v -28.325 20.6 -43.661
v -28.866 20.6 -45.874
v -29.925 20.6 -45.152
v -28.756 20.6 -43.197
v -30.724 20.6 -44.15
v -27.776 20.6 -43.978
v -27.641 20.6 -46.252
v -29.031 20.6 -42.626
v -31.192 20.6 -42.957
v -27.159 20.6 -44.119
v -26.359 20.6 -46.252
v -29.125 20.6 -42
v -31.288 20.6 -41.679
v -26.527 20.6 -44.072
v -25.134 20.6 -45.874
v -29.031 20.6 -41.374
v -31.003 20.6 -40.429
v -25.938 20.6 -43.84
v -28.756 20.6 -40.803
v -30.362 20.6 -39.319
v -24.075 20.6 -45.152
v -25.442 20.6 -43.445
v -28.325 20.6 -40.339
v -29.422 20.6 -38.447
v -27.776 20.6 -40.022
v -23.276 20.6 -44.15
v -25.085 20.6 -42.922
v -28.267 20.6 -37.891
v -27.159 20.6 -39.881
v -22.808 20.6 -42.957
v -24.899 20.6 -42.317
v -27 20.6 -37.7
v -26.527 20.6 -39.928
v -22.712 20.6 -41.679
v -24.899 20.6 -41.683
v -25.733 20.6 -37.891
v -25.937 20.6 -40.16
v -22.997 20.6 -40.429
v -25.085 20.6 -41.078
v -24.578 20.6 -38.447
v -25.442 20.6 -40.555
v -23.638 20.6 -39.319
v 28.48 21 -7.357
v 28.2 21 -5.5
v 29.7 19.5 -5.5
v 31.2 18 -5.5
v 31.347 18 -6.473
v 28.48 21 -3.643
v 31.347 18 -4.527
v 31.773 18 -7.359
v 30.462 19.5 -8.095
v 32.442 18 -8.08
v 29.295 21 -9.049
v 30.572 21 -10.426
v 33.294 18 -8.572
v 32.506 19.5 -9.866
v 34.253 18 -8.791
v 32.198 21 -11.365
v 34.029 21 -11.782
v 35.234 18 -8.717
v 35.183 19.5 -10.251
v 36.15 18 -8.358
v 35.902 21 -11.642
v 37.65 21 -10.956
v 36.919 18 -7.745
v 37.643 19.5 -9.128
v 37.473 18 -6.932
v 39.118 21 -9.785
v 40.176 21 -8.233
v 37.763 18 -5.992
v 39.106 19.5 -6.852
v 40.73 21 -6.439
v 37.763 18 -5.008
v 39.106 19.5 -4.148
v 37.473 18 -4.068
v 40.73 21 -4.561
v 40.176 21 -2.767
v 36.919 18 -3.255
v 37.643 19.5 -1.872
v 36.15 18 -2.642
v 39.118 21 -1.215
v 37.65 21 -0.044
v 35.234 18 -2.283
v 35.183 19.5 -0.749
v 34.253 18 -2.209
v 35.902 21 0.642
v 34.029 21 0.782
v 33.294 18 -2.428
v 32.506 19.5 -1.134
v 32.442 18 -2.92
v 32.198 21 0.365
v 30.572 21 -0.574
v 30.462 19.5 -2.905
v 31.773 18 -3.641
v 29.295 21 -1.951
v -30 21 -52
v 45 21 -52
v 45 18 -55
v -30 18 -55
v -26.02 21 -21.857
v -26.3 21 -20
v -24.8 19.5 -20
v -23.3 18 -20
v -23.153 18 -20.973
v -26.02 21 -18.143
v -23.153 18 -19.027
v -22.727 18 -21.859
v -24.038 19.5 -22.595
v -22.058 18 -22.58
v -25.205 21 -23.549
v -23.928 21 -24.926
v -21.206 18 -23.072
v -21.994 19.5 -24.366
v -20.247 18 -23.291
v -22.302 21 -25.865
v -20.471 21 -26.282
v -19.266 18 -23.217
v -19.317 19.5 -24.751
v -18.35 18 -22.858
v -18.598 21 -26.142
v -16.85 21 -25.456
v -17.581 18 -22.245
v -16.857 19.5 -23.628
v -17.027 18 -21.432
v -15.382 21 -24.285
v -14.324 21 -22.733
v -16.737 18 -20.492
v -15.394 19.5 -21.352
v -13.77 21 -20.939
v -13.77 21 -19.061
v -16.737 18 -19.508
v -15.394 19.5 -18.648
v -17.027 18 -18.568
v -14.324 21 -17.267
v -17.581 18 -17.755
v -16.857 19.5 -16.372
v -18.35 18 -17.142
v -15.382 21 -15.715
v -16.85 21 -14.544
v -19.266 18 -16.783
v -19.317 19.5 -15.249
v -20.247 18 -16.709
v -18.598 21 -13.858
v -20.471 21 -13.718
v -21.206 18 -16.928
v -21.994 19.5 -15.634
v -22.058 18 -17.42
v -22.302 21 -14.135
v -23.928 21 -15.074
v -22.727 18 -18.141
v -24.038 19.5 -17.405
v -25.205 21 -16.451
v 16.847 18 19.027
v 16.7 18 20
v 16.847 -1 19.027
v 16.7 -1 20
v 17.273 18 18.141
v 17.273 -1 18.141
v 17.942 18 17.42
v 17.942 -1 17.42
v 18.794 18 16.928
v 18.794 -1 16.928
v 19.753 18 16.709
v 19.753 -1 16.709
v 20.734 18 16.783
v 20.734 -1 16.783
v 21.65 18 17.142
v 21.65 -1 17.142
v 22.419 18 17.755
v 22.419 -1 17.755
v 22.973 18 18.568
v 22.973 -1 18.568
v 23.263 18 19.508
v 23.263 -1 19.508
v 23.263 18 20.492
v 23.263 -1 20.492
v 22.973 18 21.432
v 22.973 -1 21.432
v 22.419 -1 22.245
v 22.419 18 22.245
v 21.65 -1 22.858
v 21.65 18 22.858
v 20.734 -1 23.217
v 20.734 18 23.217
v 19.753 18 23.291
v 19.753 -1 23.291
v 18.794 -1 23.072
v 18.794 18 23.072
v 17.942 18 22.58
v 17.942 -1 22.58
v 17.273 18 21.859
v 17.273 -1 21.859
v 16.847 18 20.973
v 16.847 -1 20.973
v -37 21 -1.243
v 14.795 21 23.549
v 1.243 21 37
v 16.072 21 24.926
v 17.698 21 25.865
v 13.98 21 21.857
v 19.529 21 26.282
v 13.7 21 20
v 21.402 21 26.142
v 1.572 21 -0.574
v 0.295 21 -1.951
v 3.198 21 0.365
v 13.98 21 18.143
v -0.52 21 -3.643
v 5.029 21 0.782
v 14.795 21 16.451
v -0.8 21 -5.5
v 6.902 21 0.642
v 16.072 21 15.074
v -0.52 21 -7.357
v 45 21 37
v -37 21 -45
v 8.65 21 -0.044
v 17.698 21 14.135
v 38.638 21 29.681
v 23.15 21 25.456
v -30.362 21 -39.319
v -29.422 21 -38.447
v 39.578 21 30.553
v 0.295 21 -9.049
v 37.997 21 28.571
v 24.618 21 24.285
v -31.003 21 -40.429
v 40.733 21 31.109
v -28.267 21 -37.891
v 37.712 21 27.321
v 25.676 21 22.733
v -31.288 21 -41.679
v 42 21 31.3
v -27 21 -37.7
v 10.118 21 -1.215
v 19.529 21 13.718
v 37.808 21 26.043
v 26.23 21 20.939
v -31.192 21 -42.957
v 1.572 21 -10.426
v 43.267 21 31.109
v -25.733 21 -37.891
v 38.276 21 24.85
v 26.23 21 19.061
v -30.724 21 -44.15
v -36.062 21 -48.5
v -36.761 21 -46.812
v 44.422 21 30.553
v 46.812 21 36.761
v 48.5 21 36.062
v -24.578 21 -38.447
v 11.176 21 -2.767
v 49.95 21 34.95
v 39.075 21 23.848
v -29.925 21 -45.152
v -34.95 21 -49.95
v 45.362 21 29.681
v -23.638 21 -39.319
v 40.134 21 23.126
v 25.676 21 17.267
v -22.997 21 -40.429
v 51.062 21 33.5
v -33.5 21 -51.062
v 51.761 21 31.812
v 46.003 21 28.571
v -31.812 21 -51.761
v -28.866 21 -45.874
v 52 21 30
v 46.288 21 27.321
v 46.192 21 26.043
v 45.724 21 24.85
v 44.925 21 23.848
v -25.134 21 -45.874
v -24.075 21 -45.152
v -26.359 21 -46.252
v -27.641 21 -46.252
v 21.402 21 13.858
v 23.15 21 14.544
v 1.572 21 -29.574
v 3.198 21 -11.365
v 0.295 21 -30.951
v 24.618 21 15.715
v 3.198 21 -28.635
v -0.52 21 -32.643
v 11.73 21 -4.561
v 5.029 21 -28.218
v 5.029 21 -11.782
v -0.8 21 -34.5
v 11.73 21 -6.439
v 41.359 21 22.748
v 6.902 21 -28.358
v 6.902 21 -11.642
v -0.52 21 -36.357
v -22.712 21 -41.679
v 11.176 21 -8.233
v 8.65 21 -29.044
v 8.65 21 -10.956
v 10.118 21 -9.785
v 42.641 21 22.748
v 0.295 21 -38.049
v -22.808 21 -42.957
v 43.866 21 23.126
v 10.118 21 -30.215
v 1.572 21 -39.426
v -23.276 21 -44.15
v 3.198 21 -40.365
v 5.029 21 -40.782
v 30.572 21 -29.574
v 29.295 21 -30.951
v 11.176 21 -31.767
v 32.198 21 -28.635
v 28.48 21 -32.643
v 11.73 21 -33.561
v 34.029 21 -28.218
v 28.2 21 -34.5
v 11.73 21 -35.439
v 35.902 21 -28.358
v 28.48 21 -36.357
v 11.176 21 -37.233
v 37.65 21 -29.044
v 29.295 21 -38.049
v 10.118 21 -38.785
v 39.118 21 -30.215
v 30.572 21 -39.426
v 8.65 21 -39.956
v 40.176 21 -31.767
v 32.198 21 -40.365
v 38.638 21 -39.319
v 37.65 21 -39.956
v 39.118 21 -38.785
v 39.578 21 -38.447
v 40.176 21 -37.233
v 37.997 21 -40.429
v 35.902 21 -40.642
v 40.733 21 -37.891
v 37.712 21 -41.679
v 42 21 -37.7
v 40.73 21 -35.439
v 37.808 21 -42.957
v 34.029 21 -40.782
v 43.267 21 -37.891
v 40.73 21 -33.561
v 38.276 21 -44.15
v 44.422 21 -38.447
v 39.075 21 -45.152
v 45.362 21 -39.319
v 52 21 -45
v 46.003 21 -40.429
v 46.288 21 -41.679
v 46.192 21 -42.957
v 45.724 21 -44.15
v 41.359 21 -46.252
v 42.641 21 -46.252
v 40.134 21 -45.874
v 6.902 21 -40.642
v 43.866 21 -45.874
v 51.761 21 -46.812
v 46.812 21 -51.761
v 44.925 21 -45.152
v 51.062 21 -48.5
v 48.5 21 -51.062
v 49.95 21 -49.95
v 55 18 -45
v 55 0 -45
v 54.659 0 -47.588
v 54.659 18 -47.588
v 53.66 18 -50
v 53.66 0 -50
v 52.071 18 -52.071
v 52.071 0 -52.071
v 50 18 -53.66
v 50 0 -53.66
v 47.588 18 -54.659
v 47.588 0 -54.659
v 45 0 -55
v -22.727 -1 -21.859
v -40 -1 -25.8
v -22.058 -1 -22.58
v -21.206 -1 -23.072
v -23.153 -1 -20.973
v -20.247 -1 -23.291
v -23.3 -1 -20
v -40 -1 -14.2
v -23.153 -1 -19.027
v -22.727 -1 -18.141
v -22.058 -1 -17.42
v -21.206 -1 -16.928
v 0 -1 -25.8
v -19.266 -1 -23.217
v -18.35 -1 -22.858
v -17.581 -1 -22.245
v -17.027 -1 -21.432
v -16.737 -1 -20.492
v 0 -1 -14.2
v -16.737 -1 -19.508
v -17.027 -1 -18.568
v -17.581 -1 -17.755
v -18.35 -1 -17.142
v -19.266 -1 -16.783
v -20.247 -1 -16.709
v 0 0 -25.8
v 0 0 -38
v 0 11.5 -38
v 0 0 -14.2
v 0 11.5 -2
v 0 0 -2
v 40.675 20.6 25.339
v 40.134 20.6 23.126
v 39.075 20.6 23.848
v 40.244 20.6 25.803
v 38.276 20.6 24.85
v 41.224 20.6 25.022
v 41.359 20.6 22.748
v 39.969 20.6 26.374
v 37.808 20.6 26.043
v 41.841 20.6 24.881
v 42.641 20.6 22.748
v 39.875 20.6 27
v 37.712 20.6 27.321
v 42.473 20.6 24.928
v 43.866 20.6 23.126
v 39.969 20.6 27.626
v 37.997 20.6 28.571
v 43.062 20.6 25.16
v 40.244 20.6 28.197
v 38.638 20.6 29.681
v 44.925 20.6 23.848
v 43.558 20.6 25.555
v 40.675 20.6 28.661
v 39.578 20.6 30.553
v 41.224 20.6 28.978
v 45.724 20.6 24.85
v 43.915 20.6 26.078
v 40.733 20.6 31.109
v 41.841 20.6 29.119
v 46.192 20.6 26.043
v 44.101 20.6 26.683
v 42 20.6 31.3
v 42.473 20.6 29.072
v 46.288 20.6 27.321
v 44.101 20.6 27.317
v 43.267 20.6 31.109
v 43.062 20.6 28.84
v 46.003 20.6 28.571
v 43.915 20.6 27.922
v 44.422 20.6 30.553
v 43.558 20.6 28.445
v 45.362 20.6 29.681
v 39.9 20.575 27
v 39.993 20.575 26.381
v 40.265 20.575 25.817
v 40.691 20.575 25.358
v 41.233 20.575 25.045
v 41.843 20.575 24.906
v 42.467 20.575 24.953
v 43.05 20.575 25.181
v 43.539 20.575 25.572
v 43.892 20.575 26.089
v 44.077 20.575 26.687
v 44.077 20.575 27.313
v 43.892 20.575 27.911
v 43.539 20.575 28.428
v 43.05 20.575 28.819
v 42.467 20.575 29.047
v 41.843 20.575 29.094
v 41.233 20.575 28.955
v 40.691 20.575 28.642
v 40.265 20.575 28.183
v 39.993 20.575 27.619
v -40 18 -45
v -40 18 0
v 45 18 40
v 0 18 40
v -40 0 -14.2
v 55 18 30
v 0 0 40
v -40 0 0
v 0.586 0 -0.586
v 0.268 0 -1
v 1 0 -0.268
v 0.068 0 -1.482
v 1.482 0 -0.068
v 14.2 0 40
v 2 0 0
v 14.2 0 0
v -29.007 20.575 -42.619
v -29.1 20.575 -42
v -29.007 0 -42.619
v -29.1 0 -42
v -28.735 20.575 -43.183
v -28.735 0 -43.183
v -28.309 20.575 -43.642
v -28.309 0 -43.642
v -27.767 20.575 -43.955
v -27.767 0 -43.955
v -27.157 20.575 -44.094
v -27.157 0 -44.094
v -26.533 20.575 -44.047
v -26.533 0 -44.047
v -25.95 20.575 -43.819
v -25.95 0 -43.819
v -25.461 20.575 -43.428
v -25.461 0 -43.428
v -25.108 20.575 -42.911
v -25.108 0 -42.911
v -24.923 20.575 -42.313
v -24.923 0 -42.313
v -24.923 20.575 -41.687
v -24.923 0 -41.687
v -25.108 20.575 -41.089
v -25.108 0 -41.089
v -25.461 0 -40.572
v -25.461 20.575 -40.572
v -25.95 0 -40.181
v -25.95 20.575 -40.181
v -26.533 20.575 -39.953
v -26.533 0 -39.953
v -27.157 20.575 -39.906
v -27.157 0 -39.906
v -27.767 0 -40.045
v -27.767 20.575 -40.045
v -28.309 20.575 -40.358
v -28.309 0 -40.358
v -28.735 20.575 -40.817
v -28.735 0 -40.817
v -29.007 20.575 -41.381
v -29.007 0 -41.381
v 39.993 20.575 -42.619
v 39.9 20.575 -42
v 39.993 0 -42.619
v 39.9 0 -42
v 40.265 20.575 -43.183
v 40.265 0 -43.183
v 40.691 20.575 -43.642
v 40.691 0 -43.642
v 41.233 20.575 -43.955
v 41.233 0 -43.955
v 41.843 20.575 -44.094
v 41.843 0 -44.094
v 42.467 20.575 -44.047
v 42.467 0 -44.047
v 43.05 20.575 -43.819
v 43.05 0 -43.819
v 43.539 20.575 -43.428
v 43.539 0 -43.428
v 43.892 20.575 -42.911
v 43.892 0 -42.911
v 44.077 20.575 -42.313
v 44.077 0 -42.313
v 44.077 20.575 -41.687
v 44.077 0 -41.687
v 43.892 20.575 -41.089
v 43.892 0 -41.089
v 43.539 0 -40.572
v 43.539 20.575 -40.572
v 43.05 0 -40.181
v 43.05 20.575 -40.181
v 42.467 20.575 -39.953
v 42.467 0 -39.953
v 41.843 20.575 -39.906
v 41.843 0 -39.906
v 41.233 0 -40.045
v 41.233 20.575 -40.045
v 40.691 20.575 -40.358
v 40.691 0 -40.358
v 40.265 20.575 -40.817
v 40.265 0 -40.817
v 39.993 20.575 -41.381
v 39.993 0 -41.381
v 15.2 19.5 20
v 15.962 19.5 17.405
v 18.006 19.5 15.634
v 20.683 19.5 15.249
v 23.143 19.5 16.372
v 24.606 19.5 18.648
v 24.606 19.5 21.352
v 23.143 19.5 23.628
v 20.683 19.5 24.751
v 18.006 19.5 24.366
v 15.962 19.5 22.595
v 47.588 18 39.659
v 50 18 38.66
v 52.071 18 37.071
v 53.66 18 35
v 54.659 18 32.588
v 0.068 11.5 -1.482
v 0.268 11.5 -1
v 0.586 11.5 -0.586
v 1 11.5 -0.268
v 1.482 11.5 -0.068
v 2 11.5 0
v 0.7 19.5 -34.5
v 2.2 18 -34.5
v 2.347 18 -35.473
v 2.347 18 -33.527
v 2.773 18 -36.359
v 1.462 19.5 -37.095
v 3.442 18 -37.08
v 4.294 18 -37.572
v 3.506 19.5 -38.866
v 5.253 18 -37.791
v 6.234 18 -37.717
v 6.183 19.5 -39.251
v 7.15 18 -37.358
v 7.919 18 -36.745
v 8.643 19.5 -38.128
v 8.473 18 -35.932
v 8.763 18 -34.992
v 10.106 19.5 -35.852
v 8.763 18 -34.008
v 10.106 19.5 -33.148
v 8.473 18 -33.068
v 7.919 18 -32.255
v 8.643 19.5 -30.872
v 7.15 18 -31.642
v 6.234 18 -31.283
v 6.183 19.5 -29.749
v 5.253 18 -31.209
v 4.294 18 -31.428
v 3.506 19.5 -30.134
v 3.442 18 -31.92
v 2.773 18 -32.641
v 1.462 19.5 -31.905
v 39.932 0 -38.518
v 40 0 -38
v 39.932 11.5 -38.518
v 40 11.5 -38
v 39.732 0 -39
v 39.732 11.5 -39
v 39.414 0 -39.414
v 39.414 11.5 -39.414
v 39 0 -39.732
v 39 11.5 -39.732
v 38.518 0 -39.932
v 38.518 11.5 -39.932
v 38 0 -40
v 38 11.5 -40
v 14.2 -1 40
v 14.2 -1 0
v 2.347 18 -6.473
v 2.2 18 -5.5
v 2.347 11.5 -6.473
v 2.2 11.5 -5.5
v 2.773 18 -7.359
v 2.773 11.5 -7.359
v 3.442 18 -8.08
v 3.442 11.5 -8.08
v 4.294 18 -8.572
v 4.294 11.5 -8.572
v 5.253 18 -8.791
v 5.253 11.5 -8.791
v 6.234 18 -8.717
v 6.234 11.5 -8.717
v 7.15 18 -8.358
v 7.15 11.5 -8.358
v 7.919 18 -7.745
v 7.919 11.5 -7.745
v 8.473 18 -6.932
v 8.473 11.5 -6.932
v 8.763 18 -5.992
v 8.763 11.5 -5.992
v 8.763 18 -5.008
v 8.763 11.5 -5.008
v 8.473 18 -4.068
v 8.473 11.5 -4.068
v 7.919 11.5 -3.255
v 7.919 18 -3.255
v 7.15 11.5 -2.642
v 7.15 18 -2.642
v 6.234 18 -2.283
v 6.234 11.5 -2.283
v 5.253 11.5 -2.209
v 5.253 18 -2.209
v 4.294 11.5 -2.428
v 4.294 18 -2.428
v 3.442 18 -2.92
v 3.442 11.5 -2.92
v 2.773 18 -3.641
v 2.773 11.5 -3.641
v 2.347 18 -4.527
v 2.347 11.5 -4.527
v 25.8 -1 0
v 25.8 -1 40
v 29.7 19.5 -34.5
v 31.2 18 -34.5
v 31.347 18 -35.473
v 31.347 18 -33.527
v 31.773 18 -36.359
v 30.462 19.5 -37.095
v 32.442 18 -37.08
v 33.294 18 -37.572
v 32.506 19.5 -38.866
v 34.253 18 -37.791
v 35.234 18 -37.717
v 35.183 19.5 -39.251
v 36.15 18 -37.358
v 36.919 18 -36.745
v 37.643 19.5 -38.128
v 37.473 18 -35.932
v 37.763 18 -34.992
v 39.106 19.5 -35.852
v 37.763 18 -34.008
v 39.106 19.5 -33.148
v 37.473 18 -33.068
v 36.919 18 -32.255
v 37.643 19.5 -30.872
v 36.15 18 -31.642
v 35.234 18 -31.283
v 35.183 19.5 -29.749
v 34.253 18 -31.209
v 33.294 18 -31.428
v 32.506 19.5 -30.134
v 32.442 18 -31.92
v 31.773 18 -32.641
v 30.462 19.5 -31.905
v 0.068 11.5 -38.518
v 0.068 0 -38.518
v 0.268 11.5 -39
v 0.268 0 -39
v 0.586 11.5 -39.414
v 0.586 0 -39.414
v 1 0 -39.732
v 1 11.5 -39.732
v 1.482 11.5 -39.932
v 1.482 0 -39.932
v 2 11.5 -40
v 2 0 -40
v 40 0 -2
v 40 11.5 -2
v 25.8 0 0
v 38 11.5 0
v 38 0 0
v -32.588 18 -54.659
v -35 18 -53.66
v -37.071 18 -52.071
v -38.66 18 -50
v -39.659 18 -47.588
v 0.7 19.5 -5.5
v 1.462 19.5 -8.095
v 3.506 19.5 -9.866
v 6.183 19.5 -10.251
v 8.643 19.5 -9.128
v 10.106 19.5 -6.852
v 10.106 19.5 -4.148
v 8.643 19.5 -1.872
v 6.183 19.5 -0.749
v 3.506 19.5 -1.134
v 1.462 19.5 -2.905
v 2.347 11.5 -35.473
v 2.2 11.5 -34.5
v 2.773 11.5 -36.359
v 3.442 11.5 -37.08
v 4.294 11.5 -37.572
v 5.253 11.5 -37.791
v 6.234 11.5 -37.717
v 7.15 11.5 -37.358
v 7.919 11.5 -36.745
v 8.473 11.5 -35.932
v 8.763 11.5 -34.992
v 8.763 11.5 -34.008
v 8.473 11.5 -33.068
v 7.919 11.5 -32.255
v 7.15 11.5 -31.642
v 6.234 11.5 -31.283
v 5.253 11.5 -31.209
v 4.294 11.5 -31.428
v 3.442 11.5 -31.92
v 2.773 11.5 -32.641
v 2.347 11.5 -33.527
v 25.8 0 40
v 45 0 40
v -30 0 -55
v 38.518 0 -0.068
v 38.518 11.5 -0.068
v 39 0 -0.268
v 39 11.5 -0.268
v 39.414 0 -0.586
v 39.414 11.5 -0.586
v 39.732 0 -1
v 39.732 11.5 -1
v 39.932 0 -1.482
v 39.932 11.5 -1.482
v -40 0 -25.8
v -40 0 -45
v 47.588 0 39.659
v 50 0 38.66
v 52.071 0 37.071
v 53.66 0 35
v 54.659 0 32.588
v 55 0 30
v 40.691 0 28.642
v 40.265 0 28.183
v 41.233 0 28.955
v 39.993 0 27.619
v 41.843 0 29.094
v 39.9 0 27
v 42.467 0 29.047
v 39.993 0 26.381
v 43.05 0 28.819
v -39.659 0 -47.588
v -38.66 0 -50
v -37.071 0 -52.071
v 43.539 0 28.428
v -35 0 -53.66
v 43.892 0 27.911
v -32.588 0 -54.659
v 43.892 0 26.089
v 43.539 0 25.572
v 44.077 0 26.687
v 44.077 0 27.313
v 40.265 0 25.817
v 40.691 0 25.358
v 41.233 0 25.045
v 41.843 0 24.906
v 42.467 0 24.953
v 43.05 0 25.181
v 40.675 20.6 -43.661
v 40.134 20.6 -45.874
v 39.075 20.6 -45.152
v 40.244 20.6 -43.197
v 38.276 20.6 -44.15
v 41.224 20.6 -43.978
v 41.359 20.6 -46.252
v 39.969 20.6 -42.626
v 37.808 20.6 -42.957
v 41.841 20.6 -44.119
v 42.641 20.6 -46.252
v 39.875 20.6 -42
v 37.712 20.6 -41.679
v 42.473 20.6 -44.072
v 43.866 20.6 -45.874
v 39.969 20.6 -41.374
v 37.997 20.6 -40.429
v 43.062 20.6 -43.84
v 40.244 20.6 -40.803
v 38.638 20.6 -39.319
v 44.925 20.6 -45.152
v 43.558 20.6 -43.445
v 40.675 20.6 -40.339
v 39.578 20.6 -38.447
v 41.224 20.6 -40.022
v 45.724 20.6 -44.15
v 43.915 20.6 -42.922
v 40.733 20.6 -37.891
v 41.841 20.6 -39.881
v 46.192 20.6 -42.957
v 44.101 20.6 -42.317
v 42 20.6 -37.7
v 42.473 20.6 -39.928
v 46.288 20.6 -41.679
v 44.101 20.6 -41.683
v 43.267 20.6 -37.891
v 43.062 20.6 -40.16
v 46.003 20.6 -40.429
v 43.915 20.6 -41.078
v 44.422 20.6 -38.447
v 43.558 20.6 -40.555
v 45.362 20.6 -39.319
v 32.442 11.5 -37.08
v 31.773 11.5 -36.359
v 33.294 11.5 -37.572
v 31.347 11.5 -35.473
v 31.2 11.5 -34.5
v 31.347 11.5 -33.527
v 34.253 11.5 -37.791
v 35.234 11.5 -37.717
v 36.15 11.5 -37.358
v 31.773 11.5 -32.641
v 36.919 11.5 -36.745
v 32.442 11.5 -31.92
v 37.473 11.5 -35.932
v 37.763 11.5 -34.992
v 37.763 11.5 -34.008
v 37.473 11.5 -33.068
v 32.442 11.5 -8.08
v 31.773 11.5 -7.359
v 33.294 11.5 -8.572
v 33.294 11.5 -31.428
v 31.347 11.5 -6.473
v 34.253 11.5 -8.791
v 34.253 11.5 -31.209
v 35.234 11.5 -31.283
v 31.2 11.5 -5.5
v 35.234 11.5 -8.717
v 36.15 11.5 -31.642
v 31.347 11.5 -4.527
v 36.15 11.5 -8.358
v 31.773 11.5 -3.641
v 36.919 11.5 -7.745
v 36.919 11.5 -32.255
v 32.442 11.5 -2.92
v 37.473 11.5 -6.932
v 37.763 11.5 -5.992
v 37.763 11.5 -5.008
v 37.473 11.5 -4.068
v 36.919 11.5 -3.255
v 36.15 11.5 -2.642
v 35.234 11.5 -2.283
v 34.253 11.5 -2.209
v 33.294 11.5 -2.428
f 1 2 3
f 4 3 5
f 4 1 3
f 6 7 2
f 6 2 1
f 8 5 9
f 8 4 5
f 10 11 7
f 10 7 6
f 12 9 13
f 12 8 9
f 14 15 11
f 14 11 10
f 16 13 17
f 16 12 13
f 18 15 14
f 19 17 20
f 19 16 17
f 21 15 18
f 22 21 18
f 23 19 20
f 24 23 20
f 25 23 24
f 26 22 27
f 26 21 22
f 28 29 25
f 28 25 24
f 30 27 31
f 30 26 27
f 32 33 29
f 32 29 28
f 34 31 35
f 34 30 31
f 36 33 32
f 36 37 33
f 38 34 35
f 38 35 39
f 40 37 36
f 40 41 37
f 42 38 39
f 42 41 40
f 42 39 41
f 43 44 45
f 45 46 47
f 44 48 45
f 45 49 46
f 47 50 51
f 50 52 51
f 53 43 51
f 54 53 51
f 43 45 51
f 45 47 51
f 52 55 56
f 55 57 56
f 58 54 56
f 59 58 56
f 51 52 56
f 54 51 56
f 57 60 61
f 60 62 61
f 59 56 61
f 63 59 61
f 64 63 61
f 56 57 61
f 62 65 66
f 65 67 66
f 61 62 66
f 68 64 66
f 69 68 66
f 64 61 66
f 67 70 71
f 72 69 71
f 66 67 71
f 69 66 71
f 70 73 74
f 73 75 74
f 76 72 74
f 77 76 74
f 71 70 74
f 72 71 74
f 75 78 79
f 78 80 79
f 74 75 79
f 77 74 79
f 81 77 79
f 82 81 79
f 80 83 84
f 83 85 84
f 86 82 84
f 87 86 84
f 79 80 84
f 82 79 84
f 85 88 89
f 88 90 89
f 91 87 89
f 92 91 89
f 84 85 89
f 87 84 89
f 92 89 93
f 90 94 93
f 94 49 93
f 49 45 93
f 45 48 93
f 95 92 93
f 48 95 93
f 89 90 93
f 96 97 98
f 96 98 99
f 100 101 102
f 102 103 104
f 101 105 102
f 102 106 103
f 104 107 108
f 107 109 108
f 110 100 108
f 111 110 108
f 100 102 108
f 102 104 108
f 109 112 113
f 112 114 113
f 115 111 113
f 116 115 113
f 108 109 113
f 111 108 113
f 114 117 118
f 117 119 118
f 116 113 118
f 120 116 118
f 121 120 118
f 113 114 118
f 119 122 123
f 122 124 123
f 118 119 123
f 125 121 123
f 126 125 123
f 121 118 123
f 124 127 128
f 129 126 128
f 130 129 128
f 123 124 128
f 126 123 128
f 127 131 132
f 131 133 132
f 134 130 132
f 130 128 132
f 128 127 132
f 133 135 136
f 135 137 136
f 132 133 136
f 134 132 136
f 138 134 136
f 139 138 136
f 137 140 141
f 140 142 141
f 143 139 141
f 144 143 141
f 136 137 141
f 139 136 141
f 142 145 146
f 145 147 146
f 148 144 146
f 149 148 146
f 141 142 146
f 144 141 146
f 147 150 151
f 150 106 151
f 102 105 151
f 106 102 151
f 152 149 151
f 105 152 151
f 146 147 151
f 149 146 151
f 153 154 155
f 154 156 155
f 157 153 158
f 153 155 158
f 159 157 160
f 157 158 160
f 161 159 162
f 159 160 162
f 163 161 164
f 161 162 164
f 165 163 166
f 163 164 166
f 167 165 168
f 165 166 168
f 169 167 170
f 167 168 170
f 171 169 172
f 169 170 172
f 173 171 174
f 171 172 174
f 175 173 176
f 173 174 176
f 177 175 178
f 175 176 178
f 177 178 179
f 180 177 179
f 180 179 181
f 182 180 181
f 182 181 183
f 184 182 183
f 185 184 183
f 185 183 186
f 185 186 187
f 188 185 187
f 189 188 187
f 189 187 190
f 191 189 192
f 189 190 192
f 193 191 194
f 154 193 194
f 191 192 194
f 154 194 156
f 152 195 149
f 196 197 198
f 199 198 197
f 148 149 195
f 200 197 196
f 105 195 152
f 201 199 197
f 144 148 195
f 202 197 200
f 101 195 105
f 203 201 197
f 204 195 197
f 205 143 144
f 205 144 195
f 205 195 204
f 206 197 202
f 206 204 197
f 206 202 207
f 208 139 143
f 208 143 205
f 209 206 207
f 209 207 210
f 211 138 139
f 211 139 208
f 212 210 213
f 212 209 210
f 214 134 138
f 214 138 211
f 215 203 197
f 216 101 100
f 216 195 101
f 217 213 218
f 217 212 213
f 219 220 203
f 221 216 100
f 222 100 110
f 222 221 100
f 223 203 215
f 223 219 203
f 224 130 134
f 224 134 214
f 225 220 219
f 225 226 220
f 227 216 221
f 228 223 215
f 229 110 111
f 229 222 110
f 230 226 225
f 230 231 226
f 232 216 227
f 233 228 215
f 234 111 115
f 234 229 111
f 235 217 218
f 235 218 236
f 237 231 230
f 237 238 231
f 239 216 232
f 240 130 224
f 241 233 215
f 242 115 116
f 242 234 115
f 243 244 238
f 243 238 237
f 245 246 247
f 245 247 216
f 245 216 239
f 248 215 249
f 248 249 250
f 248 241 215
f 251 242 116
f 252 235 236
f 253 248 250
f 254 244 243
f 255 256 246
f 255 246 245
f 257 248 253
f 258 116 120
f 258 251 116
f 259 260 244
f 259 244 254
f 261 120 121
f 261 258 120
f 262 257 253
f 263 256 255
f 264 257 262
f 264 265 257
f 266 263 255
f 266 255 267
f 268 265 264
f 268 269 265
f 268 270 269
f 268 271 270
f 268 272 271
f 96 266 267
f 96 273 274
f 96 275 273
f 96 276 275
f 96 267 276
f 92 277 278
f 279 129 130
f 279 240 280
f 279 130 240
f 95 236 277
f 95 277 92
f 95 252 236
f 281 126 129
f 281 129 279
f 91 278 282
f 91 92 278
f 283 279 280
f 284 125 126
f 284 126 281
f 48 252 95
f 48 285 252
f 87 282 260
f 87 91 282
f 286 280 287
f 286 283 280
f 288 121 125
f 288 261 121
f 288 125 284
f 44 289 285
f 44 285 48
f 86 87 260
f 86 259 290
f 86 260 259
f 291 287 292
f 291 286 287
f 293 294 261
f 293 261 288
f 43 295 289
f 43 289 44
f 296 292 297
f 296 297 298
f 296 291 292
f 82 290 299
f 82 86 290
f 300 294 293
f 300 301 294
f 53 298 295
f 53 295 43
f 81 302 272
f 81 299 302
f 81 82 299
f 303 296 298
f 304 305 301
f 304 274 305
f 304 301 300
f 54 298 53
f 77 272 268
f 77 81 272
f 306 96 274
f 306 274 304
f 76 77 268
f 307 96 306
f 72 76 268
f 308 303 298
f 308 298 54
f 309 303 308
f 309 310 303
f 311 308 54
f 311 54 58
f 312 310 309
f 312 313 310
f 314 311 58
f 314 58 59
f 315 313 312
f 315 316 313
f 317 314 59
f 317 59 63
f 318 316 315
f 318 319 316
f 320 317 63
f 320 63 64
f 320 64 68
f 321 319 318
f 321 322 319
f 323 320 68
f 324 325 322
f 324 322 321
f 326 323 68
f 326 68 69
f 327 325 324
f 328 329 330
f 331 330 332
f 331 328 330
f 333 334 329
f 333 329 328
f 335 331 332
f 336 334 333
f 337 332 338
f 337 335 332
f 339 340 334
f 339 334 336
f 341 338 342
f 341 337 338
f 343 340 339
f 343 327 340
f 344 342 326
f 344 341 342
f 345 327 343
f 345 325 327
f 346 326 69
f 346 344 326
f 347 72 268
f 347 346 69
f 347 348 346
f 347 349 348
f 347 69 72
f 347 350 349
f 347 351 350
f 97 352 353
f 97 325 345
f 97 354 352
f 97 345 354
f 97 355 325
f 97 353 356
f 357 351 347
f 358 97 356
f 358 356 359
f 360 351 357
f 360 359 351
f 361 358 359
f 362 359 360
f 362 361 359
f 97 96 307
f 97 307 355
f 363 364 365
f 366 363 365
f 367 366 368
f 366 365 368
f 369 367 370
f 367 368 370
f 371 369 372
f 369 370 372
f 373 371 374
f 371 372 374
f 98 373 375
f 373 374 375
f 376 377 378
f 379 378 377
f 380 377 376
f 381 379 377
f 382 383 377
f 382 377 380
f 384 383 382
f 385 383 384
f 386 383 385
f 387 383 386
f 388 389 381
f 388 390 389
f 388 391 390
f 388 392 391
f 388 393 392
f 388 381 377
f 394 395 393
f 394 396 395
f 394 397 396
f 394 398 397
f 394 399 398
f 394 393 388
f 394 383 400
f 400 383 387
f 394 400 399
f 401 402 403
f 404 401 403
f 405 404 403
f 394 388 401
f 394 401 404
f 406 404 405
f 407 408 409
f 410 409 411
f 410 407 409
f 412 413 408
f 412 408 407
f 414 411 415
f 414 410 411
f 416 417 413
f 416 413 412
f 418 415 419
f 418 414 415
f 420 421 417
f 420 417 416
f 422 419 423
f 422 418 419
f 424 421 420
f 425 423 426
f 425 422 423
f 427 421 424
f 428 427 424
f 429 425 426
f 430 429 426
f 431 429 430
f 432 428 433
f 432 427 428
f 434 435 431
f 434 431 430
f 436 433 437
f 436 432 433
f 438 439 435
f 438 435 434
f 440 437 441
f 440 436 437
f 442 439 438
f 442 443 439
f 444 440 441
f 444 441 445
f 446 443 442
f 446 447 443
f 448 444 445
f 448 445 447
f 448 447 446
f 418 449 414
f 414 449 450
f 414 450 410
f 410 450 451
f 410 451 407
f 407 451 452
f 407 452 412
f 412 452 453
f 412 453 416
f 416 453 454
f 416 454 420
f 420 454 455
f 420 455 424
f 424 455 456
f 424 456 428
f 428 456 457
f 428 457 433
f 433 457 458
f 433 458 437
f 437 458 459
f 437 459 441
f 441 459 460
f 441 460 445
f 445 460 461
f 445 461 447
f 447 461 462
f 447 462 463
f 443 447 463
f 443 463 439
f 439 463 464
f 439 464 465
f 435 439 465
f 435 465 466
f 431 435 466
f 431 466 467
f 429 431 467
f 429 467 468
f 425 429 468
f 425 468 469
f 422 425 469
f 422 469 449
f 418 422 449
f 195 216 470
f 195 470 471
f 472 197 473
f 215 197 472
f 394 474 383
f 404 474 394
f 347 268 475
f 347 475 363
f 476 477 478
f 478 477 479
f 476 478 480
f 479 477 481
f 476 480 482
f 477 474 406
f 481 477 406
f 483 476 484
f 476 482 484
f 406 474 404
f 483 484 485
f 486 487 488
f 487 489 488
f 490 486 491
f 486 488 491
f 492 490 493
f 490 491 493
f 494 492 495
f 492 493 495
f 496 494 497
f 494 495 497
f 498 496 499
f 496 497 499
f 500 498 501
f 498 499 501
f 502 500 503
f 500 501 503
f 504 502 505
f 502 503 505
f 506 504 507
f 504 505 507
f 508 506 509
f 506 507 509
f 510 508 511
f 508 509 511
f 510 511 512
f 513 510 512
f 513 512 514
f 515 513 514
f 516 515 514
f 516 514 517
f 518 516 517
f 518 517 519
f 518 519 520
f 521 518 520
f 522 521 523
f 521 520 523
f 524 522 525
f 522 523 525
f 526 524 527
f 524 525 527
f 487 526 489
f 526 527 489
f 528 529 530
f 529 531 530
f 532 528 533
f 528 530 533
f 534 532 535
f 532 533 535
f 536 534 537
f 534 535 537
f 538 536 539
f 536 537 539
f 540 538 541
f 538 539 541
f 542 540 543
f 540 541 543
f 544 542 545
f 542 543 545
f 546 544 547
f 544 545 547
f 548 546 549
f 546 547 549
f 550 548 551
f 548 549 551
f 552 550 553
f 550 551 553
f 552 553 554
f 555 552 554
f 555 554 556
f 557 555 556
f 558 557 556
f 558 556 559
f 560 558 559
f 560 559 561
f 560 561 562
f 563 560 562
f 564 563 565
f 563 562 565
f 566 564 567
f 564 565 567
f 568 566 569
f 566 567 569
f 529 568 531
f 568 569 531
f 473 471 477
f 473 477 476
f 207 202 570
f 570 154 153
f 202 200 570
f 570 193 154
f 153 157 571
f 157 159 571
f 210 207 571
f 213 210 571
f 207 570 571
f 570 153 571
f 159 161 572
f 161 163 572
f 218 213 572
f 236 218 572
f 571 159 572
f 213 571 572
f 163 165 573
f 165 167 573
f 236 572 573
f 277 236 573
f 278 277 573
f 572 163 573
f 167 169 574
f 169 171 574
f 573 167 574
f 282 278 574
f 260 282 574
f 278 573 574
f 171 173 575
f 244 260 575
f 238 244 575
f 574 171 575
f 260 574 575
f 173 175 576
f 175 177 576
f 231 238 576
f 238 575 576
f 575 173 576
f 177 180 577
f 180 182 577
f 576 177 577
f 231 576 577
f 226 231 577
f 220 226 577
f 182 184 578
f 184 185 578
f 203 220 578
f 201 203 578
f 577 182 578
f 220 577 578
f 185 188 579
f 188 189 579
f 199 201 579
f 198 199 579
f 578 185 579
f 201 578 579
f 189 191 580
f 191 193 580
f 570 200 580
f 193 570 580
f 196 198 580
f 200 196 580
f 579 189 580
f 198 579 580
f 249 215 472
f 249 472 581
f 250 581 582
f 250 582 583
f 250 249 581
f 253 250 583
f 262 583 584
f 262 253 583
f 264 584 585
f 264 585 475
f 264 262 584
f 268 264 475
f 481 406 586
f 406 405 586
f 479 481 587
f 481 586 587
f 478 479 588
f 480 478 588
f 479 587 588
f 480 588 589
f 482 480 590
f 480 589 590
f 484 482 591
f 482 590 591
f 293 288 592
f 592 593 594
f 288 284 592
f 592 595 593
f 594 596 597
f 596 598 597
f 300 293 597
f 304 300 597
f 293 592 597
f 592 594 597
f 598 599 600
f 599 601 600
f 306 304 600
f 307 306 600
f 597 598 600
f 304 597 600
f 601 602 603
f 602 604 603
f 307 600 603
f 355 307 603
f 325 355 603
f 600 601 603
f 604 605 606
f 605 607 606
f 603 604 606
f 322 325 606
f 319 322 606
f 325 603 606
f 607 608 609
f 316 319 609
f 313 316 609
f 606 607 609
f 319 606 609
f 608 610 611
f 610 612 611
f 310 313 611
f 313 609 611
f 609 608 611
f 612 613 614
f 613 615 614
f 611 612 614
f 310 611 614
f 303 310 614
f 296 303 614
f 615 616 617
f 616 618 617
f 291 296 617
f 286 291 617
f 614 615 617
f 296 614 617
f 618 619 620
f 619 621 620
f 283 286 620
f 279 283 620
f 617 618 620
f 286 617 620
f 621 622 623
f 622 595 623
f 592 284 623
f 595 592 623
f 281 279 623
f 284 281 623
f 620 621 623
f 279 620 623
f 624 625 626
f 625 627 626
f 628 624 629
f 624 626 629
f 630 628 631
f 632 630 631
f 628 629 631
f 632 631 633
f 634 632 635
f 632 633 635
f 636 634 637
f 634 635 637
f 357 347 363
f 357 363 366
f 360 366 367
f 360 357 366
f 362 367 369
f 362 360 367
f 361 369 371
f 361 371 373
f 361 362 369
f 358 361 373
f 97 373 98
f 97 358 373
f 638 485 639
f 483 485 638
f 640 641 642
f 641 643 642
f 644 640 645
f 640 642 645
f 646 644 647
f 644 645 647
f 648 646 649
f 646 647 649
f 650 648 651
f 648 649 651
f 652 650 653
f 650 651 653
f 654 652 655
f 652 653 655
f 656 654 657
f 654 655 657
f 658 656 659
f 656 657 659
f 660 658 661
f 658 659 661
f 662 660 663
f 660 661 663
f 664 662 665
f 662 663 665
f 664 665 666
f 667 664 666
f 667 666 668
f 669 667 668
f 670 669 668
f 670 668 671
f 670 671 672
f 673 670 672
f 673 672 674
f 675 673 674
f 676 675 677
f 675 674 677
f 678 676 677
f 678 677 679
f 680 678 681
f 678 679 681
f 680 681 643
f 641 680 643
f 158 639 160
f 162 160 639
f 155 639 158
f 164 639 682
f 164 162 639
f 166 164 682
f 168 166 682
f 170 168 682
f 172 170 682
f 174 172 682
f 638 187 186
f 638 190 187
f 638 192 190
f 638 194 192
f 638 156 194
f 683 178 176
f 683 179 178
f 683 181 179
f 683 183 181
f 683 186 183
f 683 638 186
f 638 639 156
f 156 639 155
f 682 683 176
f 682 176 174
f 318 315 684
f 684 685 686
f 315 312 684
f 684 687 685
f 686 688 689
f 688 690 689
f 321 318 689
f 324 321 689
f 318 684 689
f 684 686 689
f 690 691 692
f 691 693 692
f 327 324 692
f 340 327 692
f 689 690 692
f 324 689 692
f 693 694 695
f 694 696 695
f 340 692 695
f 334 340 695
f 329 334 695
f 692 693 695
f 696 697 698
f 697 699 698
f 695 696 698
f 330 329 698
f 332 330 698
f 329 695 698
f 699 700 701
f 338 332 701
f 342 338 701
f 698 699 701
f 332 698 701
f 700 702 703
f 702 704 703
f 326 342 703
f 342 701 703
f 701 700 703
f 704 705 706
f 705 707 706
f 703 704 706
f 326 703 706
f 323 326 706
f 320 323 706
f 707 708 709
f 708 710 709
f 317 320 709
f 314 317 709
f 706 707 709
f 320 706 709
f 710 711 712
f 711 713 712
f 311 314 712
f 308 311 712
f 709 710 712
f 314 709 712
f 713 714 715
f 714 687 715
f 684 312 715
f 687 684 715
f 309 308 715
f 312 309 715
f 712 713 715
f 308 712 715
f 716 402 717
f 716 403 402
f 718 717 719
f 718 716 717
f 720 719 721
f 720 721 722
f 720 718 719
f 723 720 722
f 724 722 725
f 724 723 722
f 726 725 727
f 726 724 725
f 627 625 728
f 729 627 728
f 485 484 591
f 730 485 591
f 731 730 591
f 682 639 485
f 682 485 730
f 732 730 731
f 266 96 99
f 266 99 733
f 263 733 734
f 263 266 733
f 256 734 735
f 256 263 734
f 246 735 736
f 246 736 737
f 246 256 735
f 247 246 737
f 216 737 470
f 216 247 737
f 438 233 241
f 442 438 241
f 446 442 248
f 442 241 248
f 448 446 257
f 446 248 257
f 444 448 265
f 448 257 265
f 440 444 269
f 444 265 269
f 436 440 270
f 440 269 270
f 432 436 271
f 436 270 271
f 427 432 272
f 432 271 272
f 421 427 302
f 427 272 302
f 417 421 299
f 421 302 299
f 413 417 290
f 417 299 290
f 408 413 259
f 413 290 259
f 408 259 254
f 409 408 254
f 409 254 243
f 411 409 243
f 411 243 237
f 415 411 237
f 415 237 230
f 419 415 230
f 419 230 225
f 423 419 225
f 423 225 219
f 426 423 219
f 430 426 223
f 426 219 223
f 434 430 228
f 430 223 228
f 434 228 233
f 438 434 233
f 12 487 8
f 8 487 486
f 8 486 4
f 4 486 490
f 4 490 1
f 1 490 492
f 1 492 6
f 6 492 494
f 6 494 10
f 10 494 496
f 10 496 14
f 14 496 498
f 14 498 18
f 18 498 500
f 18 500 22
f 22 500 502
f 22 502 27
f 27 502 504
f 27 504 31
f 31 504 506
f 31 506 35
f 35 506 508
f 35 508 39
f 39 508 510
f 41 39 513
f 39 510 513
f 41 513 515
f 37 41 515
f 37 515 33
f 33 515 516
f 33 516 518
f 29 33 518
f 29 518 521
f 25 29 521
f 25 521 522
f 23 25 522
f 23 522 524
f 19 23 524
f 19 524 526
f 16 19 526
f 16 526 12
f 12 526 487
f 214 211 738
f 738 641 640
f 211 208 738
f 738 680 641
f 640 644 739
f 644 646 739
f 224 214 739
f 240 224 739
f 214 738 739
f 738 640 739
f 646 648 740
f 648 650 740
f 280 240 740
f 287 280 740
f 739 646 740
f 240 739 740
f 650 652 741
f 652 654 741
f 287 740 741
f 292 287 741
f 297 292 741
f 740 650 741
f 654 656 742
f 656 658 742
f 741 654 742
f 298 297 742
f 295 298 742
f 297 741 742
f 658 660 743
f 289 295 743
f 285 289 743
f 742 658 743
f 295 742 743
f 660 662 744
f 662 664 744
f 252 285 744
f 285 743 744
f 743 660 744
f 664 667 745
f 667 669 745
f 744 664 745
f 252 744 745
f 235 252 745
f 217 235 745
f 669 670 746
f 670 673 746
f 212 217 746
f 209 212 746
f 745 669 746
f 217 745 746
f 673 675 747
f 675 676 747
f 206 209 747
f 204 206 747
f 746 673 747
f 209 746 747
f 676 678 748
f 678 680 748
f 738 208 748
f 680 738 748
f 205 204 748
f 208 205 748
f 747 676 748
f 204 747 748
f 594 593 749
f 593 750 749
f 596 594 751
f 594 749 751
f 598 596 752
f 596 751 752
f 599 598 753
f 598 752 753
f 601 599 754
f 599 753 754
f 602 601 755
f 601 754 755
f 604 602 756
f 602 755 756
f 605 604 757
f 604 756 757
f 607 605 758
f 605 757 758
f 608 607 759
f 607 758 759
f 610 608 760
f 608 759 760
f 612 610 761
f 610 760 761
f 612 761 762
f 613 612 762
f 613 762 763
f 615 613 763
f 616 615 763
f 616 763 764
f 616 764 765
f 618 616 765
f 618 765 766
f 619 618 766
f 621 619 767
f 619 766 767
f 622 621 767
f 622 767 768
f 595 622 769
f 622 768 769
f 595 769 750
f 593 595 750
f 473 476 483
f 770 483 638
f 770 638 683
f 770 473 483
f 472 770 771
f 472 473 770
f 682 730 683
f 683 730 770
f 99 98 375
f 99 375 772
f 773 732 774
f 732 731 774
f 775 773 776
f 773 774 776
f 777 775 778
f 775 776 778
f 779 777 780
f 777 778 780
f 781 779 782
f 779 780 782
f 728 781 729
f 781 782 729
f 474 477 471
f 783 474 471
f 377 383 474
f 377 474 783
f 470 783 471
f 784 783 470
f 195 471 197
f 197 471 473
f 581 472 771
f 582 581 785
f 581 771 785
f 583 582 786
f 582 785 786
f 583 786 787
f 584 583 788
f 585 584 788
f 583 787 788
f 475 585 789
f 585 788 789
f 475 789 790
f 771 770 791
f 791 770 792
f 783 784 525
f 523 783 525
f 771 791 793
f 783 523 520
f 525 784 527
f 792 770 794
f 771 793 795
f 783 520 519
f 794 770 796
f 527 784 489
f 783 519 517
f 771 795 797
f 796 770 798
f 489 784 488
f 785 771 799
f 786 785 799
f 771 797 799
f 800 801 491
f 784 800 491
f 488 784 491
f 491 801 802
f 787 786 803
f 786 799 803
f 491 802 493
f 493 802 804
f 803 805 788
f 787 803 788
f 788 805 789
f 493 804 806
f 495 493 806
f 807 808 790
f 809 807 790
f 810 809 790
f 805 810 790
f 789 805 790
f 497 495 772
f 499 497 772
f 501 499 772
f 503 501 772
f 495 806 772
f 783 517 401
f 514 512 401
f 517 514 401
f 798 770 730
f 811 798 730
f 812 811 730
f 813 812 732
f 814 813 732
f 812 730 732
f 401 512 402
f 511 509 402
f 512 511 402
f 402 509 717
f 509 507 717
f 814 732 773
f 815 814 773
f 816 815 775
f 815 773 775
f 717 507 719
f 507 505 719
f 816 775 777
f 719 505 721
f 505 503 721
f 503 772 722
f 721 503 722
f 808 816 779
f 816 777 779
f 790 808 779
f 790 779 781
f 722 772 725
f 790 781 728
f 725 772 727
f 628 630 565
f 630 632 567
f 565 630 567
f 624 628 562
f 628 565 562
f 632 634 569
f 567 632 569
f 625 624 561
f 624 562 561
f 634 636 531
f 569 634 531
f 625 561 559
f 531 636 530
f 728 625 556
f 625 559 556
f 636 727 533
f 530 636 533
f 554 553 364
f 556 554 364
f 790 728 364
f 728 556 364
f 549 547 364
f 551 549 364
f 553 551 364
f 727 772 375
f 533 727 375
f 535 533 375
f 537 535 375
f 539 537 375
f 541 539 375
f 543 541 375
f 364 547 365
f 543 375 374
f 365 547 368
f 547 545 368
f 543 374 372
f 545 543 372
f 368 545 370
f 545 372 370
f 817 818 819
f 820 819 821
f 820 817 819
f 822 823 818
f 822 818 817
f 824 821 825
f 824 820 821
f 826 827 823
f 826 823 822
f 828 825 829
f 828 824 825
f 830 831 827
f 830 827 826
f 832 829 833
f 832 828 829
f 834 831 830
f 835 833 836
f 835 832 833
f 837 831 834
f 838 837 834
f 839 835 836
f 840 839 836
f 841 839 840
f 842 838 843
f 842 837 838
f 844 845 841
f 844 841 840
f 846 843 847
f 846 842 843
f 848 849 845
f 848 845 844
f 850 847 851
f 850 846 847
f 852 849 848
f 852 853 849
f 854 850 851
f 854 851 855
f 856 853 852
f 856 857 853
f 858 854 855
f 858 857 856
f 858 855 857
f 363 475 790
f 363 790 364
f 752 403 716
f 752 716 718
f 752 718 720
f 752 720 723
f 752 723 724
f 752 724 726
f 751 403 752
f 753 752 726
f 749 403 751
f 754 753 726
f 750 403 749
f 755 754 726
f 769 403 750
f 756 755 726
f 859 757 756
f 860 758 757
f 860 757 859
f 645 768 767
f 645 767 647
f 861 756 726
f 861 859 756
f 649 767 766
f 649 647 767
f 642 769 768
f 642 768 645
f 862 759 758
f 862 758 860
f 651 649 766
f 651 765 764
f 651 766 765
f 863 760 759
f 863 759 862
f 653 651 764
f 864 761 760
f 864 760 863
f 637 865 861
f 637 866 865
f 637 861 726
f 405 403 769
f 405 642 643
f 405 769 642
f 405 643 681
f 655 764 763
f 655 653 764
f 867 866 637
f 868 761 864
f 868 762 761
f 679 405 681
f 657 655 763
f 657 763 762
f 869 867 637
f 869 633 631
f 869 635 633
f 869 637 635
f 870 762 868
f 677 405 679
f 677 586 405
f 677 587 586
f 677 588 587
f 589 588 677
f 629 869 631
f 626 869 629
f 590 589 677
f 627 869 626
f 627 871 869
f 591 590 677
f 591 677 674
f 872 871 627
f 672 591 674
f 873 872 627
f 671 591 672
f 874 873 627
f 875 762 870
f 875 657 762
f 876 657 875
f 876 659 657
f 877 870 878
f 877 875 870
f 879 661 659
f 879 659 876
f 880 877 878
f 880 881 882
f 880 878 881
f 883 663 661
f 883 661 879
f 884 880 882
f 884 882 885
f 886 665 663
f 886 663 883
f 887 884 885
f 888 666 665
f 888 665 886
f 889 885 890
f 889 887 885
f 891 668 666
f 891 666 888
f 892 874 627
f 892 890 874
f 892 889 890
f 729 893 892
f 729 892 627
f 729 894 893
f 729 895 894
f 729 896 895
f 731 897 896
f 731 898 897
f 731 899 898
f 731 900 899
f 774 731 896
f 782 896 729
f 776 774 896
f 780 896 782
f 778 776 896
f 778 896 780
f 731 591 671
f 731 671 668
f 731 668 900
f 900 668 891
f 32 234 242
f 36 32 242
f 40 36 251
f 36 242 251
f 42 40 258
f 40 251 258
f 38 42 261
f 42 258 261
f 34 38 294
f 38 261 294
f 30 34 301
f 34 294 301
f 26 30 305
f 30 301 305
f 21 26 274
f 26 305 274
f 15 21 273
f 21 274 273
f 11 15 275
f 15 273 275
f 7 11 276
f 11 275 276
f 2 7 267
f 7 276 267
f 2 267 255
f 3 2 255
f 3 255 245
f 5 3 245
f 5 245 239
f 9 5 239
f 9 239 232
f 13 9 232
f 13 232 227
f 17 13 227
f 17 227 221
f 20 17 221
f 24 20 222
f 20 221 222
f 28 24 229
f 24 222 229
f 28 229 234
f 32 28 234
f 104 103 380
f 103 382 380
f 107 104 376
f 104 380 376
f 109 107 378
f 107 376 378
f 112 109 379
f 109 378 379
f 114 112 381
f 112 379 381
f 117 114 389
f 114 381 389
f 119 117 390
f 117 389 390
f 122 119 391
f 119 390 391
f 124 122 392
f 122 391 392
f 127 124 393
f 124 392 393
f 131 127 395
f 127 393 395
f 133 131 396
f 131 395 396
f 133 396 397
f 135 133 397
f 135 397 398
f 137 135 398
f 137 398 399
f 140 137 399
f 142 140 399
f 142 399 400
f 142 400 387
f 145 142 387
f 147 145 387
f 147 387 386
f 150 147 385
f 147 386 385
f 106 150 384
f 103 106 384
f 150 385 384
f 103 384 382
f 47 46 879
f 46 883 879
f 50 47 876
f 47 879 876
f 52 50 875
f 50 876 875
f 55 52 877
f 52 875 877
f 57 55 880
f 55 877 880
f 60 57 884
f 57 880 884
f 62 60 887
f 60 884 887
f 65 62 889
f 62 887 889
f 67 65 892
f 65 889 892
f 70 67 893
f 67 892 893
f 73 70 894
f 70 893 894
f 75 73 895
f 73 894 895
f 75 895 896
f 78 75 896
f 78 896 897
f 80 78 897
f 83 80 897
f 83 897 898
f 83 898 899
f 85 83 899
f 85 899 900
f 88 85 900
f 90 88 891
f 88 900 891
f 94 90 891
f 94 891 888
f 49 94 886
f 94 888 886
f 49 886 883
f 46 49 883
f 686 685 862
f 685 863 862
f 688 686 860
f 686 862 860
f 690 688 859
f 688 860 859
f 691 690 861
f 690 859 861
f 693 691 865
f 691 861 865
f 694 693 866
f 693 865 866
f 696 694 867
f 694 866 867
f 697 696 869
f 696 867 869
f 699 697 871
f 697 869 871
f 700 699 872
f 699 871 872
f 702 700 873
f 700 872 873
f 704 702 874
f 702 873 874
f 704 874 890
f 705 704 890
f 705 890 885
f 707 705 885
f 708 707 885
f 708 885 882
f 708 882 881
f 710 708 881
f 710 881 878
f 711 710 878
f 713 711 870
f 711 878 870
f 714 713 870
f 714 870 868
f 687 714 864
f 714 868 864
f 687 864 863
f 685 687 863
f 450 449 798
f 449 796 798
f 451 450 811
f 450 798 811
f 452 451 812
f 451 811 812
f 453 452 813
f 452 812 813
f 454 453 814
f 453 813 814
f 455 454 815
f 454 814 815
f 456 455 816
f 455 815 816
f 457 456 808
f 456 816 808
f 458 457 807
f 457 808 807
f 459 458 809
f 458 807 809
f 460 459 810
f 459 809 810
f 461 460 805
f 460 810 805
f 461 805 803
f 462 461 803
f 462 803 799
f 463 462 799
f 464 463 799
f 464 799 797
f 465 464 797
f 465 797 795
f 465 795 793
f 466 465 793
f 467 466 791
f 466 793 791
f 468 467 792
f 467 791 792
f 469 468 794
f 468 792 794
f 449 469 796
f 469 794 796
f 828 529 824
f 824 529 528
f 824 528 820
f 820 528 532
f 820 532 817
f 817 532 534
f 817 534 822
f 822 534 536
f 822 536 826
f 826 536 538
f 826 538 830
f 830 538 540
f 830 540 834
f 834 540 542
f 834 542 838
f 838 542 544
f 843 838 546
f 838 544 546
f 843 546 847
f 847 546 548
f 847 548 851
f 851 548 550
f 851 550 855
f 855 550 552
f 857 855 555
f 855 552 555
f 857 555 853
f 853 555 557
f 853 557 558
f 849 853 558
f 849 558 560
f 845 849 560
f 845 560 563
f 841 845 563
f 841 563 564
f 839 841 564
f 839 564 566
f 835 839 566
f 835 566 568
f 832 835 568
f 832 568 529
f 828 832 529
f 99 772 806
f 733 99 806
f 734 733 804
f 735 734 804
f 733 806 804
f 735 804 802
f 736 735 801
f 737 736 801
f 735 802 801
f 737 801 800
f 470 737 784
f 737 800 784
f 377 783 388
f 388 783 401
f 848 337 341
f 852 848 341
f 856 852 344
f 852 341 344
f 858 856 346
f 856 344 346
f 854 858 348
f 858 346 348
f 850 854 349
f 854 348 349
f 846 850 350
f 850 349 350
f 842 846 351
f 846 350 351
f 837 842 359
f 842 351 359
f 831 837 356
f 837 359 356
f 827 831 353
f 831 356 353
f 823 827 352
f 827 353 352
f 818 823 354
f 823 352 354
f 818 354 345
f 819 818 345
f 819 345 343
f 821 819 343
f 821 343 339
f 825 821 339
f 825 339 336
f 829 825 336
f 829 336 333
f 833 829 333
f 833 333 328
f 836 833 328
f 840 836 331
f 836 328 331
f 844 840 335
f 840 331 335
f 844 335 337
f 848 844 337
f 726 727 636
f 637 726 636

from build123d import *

# Parameters (mm, degrees)
SKETCH_1_W                 = 80
SKETCH_1_H                 = 80
EXTRUDE_314_DEPTH          = 21
EXTRUDE_603_DEPTH          = 21
CUT_EXTRUDE_830_DEPTH      = 81.566742518
SKETCH_3_W                 = 40
SKETCH_3_H                 = 40
CUT_EXTRUDE_1062_DEPTH     = 11.5
FILLET_1_R                 = 2
SKETCH_14_W                = 40
SKETCH_14_H                = 11.6
SKETCH_14_W_2              = 11.6
SKETCH_14_H_2              = 40
EXTRUDE_1761_DEPTH         = 1
HOLE_WIZARD_M6_D           = 6.6
HOLE_WIZARD_M6_CSINK_D     = 12.6
HOLE_WIZARD_M6_CSINK_ANGLE = 90
HOLE_WIZARD_M5_D           = 4.2
HOLE_WIZARD_M5_CSINK_D     = 5.05
HOLE_WIZARD_M5_CSINK_ANGLE = 90
FILLET_2_R                 = 10
CHAMFER_1_SIZE             = 3
SKETCH_15_R                = 4.3
CUT_EXTRUDE_1_DEPTH        = 0.4


with BuildPart() as part:
    # Эскиз1 → Extrude 314 (new body)
    with BuildSketch(Plane(origin=(0, 0, 0), x_dir=(1, 0, 0), z_dir=(0, 1, 0))):
        Rectangle(SKETCH_1_W, SKETCH_1_H)
    extrude(amount=EXTRUDE_314_DEPTH)

    # Эскиз11 → Extrude 603 (add)
    with BuildSketch(Plane(origin=(0, 21, 0), x_dir=(1, 0, 0), z_dir=(0, 1, 0))):
        Polygon((40, -40), (55, -40), (55, 55), (-40, 55), (-40, 40), (40, 40), align=None)
    extrude(amount=-EXTRUDE_603_DEPTH)

    # Эскиз2 → Cut-Extrude 830 (cut, through all)
    with BuildSketch(Plane(origin=(0, 21, 0), x_dir=(1, 0, 0), z_dir=(0, 1, 0))):
        Polygon((-40, -40), (-40, 0), (0, -40), align=None)
    extrude(amount=-CUT_EXTRUDE_830_DEPTH, mode=Mode.SUBTRACT)

    # Эскиз3 → Cut-Extrude 1062 (cut)
    with BuildSketch(Plane.XZ):
        with Locations((20, -20)):
            Rectangle(SKETCH_3_W, SKETCH_3_H)
    extrude(amount=-CUT_EXTRUDE_1062_DEPTH, mode=Mode.SUBTRACT)

    # Скругление1
    fillet_1_edges = [part.edges().sort_by_distance(p)[0] for p in [
        (40, 5.75, 0),
        (40, 5.75, -40),
        (0, 5.75, -40),
        (0, 5.75, 0),
    ]]
    fillet(fillet_1_edges, radius=FILLET_1_R)

    # Эскиз14 → Extrude 1761 (add)
    with BuildSketch(Plane.XZ):
        with Locations((-20, -20)):
            Rectangle(SKETCH_14_W, SKETCH_14_H)
        with Locations((20, 20)):
            Rectangle(SKETCH_14_W_2, SKETCH_14_H_2)
    extrude(amount=EXTRUDE_1761_DEPTH)

    # Крепление-M6 (through all)
    with Locations(Plane(origin=(0, 21, 0), x_dir=(1, 0, 0), z_dir=(0, 1, 0))):
        with Locations((-20, 20), (20, -20), (5.5, 34.5), (34.5, 34.5), (34.5, 5.5), (5.5, 5.5)):
            CounterSinkHole(HOLE_WIZARD_M6_D / 2, HOLE_WIZARD_M6_CSINK_D / 2, counter_sink_angle=HOLE_WIZARD_M6_CSINK_ANGLE)

    # Шкивы-M5 (through all)
    with Locations(Plane(origin=(0, 21, 0), x_dir=(1, 0, 0), z_dir=(0, 1, 0))):
        with Locations((42, 42), (-27, 42), (42, -27)):
            CounterSinkHole(HOLE_WIZARD_M5_D / 2, HOLE_WIZARD_M5_CSINK_D / 2, counter_sink_angle=HOLE_WIZARD_M5_CSINK_ANGLE)

    # Скругление2
    fillet_2_edges = [part.edges().sort_by_distance(p)[0] for p in [
        (-40, 10.5, -55),
        (55, 10.5, -55),
        (55, 10.5, 40),
    ]]
    fillet(fillet_2_edges, radius=FILLET_2_R)

    # Фаска1
    chamfer_1_edges = [part.edges().sort_by_distance(p)[0] for p in [
        (7.5, 21, -55),
        (55, 21, -7.5),
        (-40, 21, -22.5),
        (52.071067812, 21, 37.071067812),
        (52.071067812, 21, -52.071067812),
        (-37.071067812, 21, -52.071067812),
        (22.5, 21, 40),
        (-20, 21, 20),
    ]]
    chamfer(chamfer_1_edges, length=CHAMFER_1_SIZE)

    # Эскиз15 → Вырез-Вытянуть1 (cut)
    with BuildSketch(Plane(origin=(0, 21, 0), x_dir=(1, 0, 0), z_dir=(0, 1, 0))):
        with Locations(Location((42, 42, 0), (0, 0, 270))):
            Circle(SKETCH_15_R)
        with Locations(Location((-27, 42, 0), (0, 0, 270))):
            Circle(SKETCH_15_R)
        with Locations(Location((42, -27, 0), (0, 0, 270))):
            Circle(SKETCH_15_R)
    extrude(amount=-CUT_EXTRUDE_1_DEPTH, mode=Mode.SUBTRACT)


solid = part.part
